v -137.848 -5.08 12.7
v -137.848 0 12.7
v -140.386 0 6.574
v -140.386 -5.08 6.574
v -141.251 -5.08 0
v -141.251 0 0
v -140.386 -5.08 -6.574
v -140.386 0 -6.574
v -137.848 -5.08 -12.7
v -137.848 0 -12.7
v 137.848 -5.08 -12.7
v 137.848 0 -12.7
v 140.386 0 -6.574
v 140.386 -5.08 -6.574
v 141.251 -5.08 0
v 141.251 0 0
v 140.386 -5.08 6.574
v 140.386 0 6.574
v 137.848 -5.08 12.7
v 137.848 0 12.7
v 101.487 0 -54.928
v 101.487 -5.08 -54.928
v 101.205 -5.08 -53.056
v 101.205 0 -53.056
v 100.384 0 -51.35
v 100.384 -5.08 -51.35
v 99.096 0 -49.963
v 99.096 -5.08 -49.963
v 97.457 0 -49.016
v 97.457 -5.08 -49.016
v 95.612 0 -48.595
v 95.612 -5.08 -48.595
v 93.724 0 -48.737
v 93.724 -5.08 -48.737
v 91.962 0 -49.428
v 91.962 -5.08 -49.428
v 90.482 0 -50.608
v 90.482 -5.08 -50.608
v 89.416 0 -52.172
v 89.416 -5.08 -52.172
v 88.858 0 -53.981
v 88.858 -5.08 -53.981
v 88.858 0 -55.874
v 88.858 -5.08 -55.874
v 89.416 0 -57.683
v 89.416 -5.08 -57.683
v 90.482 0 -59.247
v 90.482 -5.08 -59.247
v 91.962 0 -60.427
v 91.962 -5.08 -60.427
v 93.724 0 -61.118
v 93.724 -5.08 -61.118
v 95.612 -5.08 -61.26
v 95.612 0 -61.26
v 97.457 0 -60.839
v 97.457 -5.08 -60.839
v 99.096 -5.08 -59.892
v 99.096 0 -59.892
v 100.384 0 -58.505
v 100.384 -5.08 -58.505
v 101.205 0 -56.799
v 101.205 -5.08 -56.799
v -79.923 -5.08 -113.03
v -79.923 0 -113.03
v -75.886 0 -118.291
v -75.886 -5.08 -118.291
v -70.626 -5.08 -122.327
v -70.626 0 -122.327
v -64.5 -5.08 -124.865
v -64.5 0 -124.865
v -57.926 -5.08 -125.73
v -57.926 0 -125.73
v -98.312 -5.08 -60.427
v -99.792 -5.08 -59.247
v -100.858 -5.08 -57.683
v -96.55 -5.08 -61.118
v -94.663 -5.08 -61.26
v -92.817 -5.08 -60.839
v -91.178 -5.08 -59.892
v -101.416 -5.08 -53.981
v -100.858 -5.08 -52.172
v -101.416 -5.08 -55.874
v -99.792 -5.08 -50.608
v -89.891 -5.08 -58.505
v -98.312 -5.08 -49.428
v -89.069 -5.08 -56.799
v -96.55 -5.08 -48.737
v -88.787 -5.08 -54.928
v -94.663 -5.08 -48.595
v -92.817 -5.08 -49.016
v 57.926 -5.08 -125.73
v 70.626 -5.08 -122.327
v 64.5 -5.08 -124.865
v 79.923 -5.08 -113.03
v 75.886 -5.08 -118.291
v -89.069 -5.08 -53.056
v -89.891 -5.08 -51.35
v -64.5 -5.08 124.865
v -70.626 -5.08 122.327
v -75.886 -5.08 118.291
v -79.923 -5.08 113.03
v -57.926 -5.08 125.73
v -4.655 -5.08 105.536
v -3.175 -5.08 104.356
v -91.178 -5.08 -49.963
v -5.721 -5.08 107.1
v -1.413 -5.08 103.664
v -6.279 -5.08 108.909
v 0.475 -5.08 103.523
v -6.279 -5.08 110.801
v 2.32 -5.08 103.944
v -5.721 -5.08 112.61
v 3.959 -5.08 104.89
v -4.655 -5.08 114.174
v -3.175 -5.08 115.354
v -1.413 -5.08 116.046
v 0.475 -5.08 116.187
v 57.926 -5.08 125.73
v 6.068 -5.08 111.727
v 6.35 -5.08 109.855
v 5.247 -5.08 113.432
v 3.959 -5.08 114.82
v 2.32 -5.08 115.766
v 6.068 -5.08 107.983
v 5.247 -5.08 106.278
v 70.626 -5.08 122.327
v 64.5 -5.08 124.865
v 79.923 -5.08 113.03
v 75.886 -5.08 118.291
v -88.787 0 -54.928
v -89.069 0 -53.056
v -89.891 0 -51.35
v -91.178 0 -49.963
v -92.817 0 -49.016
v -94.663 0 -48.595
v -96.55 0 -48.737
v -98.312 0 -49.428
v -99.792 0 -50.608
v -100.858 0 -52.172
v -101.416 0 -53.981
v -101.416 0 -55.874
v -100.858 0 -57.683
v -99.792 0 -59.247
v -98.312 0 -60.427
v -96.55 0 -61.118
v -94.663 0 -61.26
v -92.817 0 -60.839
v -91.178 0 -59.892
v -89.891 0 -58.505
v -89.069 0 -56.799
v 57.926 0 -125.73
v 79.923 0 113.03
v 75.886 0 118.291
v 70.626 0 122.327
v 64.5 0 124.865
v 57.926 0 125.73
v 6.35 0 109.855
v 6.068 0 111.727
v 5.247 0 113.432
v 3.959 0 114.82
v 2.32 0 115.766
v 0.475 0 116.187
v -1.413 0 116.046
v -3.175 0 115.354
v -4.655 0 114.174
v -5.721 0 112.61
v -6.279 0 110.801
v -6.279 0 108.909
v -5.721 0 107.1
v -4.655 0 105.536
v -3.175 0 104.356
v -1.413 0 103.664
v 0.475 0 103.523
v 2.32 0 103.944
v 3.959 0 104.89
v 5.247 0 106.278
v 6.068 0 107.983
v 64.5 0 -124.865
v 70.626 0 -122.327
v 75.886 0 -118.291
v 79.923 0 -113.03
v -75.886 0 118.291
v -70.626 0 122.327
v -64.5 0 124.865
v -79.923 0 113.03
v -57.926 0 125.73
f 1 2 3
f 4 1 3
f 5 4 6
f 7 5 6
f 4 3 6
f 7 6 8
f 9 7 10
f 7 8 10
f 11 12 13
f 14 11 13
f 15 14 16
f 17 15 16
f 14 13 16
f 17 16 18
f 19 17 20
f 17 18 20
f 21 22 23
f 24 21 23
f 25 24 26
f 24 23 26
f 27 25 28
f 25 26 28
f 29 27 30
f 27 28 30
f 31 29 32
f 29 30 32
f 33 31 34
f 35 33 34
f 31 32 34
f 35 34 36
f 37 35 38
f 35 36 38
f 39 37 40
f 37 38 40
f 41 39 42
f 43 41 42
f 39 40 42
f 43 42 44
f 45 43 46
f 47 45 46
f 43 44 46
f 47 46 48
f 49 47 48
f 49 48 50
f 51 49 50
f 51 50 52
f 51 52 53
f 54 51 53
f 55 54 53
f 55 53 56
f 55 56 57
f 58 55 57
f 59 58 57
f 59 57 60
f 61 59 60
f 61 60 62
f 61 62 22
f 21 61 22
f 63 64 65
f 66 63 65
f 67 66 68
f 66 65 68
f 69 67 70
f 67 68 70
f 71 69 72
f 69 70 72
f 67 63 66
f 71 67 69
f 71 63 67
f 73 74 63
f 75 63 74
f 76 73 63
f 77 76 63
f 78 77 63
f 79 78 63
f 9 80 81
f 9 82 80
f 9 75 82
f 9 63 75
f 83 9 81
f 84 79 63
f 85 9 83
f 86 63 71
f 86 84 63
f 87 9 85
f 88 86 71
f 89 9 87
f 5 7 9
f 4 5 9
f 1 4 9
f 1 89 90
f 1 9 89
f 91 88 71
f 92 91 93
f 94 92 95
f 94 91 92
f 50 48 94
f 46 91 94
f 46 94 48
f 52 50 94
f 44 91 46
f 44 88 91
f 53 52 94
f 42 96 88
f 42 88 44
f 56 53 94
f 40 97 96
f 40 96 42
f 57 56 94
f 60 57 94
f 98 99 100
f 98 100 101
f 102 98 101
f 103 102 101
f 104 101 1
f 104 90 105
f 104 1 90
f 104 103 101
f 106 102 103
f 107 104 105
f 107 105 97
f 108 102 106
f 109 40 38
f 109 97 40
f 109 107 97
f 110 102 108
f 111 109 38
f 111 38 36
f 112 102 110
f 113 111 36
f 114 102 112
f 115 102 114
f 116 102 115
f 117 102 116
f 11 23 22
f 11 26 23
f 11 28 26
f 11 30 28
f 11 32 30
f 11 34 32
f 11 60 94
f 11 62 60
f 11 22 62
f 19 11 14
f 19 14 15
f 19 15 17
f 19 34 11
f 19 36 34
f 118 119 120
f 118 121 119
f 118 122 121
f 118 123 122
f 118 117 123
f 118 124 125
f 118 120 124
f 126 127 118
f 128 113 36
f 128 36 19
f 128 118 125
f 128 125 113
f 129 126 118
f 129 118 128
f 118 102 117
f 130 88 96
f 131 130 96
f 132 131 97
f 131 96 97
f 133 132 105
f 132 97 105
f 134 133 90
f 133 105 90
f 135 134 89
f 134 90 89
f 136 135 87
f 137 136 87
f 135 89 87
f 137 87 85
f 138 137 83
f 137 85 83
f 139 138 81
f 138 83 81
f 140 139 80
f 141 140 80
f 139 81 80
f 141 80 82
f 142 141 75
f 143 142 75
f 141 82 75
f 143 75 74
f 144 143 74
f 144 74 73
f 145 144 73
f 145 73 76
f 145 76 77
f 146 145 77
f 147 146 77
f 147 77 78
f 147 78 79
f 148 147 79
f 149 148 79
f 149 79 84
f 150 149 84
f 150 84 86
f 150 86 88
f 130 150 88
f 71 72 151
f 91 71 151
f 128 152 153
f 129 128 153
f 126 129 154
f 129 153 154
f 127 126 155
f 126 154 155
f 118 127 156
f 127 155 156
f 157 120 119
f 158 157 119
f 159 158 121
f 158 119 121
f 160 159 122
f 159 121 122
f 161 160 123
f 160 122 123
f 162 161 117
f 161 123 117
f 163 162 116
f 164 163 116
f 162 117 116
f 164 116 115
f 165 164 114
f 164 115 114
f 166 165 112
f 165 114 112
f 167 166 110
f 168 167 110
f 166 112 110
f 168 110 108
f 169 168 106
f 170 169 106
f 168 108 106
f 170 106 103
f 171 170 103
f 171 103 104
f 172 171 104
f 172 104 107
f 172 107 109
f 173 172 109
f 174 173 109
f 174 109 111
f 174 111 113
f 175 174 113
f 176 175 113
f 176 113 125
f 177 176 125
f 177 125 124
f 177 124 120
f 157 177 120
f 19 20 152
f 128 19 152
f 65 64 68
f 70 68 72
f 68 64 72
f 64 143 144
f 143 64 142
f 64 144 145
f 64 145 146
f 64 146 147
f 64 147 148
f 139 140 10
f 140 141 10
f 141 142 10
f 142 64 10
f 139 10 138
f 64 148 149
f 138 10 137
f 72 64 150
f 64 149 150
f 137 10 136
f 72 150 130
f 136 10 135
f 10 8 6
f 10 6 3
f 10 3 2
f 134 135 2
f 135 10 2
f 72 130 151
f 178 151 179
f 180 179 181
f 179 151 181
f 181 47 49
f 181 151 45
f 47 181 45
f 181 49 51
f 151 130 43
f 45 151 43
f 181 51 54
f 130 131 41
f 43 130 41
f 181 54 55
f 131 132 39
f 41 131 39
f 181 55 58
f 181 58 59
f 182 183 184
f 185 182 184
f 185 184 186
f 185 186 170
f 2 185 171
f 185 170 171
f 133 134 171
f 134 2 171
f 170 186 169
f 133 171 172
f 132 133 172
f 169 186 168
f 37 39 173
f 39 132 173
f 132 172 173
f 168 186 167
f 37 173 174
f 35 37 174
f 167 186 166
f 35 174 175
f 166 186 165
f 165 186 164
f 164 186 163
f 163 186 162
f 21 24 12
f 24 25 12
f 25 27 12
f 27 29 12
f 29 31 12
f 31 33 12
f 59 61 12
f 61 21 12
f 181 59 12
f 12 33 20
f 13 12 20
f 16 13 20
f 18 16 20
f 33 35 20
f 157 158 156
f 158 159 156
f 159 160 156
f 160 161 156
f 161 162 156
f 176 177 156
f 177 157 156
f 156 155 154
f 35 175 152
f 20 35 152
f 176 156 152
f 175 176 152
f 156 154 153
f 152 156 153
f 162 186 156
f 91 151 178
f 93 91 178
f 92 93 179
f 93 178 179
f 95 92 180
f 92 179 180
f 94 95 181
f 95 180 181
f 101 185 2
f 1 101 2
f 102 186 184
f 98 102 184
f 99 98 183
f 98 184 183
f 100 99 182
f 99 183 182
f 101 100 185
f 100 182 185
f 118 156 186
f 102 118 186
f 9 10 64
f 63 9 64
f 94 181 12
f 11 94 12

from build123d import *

# Parameters (mm, degrees)
F1_DEPTH = 5.08
F2_R     = 6.35
F3_DEPTH = 5.081


# Not quite as in the source:
# - a feature names something its author has since deleted; it is built from what else it names


with BuildPart() as f1:
    # F0 (on Front) → F1 (new body)
    with BuildSketch(Plane.XZ):
        with BuildLine():
            Line((137.8481502717, 12.7), (79.9225977639, 113.03))
            ThreePointArc((79.9225977639, 113.03), (70.6255525078, 122.3270452561), (57.9255525078, 125.73))
            Line((57.9255525078, 125.73), (-57.9255525078, 125.73))
            ThreePointArc((-57.9255525078, 125.73), (-70.6255525078, 122.3270452561), (-79.9225977639, 113.03))
            Line((-79.9225977639, 113.03), (-137.8481502717, 12.7))
            ThreePointArc((-137.8481502717, 12.7), (-141.2511050156, 0), (-137.8481502717, -12.7))
            Line((-137.8481502717, -12.7), (-79.9225977639, -113.03))
            ThreePointArc((-79.9225977639, -113.03), (-70.6255525078, -122.3270452561), (-57.9255525078, -125.73))
            Line((-57.9255525078, -125.73), (57.9255525078, -125.73))
            ThreePointArc((57.9255525078, -125.73), (70.6255525078, -122.3270452561), (79.9225977639, -113.03))
            Line((79.9225977639, -113.03), (137.8481502717, -12.7))
            ThreePointArc((137.8481502717, -12.7), (141.2511050156, 0), (137.8481502717, 12.7))
        make_face()
    extrude(amount=F1_DEPTH)

    # F2 (on face) → F3 (cut, through all)
    with BuildSketch(Plane.XZ.offset(5.08)):
        with Locations((0, 109.855)):
            Circle(F2_R)
        with Locations((-95.1372207327, -54.9275)):
            Circle(F2_R)
        with Locations((95.1372207327, -54.9275)):
            Circle(F2_R)
    extrude(amount=-F3_DEPTH, mode=Mode.SUBTRACT)


solid = f1.part
